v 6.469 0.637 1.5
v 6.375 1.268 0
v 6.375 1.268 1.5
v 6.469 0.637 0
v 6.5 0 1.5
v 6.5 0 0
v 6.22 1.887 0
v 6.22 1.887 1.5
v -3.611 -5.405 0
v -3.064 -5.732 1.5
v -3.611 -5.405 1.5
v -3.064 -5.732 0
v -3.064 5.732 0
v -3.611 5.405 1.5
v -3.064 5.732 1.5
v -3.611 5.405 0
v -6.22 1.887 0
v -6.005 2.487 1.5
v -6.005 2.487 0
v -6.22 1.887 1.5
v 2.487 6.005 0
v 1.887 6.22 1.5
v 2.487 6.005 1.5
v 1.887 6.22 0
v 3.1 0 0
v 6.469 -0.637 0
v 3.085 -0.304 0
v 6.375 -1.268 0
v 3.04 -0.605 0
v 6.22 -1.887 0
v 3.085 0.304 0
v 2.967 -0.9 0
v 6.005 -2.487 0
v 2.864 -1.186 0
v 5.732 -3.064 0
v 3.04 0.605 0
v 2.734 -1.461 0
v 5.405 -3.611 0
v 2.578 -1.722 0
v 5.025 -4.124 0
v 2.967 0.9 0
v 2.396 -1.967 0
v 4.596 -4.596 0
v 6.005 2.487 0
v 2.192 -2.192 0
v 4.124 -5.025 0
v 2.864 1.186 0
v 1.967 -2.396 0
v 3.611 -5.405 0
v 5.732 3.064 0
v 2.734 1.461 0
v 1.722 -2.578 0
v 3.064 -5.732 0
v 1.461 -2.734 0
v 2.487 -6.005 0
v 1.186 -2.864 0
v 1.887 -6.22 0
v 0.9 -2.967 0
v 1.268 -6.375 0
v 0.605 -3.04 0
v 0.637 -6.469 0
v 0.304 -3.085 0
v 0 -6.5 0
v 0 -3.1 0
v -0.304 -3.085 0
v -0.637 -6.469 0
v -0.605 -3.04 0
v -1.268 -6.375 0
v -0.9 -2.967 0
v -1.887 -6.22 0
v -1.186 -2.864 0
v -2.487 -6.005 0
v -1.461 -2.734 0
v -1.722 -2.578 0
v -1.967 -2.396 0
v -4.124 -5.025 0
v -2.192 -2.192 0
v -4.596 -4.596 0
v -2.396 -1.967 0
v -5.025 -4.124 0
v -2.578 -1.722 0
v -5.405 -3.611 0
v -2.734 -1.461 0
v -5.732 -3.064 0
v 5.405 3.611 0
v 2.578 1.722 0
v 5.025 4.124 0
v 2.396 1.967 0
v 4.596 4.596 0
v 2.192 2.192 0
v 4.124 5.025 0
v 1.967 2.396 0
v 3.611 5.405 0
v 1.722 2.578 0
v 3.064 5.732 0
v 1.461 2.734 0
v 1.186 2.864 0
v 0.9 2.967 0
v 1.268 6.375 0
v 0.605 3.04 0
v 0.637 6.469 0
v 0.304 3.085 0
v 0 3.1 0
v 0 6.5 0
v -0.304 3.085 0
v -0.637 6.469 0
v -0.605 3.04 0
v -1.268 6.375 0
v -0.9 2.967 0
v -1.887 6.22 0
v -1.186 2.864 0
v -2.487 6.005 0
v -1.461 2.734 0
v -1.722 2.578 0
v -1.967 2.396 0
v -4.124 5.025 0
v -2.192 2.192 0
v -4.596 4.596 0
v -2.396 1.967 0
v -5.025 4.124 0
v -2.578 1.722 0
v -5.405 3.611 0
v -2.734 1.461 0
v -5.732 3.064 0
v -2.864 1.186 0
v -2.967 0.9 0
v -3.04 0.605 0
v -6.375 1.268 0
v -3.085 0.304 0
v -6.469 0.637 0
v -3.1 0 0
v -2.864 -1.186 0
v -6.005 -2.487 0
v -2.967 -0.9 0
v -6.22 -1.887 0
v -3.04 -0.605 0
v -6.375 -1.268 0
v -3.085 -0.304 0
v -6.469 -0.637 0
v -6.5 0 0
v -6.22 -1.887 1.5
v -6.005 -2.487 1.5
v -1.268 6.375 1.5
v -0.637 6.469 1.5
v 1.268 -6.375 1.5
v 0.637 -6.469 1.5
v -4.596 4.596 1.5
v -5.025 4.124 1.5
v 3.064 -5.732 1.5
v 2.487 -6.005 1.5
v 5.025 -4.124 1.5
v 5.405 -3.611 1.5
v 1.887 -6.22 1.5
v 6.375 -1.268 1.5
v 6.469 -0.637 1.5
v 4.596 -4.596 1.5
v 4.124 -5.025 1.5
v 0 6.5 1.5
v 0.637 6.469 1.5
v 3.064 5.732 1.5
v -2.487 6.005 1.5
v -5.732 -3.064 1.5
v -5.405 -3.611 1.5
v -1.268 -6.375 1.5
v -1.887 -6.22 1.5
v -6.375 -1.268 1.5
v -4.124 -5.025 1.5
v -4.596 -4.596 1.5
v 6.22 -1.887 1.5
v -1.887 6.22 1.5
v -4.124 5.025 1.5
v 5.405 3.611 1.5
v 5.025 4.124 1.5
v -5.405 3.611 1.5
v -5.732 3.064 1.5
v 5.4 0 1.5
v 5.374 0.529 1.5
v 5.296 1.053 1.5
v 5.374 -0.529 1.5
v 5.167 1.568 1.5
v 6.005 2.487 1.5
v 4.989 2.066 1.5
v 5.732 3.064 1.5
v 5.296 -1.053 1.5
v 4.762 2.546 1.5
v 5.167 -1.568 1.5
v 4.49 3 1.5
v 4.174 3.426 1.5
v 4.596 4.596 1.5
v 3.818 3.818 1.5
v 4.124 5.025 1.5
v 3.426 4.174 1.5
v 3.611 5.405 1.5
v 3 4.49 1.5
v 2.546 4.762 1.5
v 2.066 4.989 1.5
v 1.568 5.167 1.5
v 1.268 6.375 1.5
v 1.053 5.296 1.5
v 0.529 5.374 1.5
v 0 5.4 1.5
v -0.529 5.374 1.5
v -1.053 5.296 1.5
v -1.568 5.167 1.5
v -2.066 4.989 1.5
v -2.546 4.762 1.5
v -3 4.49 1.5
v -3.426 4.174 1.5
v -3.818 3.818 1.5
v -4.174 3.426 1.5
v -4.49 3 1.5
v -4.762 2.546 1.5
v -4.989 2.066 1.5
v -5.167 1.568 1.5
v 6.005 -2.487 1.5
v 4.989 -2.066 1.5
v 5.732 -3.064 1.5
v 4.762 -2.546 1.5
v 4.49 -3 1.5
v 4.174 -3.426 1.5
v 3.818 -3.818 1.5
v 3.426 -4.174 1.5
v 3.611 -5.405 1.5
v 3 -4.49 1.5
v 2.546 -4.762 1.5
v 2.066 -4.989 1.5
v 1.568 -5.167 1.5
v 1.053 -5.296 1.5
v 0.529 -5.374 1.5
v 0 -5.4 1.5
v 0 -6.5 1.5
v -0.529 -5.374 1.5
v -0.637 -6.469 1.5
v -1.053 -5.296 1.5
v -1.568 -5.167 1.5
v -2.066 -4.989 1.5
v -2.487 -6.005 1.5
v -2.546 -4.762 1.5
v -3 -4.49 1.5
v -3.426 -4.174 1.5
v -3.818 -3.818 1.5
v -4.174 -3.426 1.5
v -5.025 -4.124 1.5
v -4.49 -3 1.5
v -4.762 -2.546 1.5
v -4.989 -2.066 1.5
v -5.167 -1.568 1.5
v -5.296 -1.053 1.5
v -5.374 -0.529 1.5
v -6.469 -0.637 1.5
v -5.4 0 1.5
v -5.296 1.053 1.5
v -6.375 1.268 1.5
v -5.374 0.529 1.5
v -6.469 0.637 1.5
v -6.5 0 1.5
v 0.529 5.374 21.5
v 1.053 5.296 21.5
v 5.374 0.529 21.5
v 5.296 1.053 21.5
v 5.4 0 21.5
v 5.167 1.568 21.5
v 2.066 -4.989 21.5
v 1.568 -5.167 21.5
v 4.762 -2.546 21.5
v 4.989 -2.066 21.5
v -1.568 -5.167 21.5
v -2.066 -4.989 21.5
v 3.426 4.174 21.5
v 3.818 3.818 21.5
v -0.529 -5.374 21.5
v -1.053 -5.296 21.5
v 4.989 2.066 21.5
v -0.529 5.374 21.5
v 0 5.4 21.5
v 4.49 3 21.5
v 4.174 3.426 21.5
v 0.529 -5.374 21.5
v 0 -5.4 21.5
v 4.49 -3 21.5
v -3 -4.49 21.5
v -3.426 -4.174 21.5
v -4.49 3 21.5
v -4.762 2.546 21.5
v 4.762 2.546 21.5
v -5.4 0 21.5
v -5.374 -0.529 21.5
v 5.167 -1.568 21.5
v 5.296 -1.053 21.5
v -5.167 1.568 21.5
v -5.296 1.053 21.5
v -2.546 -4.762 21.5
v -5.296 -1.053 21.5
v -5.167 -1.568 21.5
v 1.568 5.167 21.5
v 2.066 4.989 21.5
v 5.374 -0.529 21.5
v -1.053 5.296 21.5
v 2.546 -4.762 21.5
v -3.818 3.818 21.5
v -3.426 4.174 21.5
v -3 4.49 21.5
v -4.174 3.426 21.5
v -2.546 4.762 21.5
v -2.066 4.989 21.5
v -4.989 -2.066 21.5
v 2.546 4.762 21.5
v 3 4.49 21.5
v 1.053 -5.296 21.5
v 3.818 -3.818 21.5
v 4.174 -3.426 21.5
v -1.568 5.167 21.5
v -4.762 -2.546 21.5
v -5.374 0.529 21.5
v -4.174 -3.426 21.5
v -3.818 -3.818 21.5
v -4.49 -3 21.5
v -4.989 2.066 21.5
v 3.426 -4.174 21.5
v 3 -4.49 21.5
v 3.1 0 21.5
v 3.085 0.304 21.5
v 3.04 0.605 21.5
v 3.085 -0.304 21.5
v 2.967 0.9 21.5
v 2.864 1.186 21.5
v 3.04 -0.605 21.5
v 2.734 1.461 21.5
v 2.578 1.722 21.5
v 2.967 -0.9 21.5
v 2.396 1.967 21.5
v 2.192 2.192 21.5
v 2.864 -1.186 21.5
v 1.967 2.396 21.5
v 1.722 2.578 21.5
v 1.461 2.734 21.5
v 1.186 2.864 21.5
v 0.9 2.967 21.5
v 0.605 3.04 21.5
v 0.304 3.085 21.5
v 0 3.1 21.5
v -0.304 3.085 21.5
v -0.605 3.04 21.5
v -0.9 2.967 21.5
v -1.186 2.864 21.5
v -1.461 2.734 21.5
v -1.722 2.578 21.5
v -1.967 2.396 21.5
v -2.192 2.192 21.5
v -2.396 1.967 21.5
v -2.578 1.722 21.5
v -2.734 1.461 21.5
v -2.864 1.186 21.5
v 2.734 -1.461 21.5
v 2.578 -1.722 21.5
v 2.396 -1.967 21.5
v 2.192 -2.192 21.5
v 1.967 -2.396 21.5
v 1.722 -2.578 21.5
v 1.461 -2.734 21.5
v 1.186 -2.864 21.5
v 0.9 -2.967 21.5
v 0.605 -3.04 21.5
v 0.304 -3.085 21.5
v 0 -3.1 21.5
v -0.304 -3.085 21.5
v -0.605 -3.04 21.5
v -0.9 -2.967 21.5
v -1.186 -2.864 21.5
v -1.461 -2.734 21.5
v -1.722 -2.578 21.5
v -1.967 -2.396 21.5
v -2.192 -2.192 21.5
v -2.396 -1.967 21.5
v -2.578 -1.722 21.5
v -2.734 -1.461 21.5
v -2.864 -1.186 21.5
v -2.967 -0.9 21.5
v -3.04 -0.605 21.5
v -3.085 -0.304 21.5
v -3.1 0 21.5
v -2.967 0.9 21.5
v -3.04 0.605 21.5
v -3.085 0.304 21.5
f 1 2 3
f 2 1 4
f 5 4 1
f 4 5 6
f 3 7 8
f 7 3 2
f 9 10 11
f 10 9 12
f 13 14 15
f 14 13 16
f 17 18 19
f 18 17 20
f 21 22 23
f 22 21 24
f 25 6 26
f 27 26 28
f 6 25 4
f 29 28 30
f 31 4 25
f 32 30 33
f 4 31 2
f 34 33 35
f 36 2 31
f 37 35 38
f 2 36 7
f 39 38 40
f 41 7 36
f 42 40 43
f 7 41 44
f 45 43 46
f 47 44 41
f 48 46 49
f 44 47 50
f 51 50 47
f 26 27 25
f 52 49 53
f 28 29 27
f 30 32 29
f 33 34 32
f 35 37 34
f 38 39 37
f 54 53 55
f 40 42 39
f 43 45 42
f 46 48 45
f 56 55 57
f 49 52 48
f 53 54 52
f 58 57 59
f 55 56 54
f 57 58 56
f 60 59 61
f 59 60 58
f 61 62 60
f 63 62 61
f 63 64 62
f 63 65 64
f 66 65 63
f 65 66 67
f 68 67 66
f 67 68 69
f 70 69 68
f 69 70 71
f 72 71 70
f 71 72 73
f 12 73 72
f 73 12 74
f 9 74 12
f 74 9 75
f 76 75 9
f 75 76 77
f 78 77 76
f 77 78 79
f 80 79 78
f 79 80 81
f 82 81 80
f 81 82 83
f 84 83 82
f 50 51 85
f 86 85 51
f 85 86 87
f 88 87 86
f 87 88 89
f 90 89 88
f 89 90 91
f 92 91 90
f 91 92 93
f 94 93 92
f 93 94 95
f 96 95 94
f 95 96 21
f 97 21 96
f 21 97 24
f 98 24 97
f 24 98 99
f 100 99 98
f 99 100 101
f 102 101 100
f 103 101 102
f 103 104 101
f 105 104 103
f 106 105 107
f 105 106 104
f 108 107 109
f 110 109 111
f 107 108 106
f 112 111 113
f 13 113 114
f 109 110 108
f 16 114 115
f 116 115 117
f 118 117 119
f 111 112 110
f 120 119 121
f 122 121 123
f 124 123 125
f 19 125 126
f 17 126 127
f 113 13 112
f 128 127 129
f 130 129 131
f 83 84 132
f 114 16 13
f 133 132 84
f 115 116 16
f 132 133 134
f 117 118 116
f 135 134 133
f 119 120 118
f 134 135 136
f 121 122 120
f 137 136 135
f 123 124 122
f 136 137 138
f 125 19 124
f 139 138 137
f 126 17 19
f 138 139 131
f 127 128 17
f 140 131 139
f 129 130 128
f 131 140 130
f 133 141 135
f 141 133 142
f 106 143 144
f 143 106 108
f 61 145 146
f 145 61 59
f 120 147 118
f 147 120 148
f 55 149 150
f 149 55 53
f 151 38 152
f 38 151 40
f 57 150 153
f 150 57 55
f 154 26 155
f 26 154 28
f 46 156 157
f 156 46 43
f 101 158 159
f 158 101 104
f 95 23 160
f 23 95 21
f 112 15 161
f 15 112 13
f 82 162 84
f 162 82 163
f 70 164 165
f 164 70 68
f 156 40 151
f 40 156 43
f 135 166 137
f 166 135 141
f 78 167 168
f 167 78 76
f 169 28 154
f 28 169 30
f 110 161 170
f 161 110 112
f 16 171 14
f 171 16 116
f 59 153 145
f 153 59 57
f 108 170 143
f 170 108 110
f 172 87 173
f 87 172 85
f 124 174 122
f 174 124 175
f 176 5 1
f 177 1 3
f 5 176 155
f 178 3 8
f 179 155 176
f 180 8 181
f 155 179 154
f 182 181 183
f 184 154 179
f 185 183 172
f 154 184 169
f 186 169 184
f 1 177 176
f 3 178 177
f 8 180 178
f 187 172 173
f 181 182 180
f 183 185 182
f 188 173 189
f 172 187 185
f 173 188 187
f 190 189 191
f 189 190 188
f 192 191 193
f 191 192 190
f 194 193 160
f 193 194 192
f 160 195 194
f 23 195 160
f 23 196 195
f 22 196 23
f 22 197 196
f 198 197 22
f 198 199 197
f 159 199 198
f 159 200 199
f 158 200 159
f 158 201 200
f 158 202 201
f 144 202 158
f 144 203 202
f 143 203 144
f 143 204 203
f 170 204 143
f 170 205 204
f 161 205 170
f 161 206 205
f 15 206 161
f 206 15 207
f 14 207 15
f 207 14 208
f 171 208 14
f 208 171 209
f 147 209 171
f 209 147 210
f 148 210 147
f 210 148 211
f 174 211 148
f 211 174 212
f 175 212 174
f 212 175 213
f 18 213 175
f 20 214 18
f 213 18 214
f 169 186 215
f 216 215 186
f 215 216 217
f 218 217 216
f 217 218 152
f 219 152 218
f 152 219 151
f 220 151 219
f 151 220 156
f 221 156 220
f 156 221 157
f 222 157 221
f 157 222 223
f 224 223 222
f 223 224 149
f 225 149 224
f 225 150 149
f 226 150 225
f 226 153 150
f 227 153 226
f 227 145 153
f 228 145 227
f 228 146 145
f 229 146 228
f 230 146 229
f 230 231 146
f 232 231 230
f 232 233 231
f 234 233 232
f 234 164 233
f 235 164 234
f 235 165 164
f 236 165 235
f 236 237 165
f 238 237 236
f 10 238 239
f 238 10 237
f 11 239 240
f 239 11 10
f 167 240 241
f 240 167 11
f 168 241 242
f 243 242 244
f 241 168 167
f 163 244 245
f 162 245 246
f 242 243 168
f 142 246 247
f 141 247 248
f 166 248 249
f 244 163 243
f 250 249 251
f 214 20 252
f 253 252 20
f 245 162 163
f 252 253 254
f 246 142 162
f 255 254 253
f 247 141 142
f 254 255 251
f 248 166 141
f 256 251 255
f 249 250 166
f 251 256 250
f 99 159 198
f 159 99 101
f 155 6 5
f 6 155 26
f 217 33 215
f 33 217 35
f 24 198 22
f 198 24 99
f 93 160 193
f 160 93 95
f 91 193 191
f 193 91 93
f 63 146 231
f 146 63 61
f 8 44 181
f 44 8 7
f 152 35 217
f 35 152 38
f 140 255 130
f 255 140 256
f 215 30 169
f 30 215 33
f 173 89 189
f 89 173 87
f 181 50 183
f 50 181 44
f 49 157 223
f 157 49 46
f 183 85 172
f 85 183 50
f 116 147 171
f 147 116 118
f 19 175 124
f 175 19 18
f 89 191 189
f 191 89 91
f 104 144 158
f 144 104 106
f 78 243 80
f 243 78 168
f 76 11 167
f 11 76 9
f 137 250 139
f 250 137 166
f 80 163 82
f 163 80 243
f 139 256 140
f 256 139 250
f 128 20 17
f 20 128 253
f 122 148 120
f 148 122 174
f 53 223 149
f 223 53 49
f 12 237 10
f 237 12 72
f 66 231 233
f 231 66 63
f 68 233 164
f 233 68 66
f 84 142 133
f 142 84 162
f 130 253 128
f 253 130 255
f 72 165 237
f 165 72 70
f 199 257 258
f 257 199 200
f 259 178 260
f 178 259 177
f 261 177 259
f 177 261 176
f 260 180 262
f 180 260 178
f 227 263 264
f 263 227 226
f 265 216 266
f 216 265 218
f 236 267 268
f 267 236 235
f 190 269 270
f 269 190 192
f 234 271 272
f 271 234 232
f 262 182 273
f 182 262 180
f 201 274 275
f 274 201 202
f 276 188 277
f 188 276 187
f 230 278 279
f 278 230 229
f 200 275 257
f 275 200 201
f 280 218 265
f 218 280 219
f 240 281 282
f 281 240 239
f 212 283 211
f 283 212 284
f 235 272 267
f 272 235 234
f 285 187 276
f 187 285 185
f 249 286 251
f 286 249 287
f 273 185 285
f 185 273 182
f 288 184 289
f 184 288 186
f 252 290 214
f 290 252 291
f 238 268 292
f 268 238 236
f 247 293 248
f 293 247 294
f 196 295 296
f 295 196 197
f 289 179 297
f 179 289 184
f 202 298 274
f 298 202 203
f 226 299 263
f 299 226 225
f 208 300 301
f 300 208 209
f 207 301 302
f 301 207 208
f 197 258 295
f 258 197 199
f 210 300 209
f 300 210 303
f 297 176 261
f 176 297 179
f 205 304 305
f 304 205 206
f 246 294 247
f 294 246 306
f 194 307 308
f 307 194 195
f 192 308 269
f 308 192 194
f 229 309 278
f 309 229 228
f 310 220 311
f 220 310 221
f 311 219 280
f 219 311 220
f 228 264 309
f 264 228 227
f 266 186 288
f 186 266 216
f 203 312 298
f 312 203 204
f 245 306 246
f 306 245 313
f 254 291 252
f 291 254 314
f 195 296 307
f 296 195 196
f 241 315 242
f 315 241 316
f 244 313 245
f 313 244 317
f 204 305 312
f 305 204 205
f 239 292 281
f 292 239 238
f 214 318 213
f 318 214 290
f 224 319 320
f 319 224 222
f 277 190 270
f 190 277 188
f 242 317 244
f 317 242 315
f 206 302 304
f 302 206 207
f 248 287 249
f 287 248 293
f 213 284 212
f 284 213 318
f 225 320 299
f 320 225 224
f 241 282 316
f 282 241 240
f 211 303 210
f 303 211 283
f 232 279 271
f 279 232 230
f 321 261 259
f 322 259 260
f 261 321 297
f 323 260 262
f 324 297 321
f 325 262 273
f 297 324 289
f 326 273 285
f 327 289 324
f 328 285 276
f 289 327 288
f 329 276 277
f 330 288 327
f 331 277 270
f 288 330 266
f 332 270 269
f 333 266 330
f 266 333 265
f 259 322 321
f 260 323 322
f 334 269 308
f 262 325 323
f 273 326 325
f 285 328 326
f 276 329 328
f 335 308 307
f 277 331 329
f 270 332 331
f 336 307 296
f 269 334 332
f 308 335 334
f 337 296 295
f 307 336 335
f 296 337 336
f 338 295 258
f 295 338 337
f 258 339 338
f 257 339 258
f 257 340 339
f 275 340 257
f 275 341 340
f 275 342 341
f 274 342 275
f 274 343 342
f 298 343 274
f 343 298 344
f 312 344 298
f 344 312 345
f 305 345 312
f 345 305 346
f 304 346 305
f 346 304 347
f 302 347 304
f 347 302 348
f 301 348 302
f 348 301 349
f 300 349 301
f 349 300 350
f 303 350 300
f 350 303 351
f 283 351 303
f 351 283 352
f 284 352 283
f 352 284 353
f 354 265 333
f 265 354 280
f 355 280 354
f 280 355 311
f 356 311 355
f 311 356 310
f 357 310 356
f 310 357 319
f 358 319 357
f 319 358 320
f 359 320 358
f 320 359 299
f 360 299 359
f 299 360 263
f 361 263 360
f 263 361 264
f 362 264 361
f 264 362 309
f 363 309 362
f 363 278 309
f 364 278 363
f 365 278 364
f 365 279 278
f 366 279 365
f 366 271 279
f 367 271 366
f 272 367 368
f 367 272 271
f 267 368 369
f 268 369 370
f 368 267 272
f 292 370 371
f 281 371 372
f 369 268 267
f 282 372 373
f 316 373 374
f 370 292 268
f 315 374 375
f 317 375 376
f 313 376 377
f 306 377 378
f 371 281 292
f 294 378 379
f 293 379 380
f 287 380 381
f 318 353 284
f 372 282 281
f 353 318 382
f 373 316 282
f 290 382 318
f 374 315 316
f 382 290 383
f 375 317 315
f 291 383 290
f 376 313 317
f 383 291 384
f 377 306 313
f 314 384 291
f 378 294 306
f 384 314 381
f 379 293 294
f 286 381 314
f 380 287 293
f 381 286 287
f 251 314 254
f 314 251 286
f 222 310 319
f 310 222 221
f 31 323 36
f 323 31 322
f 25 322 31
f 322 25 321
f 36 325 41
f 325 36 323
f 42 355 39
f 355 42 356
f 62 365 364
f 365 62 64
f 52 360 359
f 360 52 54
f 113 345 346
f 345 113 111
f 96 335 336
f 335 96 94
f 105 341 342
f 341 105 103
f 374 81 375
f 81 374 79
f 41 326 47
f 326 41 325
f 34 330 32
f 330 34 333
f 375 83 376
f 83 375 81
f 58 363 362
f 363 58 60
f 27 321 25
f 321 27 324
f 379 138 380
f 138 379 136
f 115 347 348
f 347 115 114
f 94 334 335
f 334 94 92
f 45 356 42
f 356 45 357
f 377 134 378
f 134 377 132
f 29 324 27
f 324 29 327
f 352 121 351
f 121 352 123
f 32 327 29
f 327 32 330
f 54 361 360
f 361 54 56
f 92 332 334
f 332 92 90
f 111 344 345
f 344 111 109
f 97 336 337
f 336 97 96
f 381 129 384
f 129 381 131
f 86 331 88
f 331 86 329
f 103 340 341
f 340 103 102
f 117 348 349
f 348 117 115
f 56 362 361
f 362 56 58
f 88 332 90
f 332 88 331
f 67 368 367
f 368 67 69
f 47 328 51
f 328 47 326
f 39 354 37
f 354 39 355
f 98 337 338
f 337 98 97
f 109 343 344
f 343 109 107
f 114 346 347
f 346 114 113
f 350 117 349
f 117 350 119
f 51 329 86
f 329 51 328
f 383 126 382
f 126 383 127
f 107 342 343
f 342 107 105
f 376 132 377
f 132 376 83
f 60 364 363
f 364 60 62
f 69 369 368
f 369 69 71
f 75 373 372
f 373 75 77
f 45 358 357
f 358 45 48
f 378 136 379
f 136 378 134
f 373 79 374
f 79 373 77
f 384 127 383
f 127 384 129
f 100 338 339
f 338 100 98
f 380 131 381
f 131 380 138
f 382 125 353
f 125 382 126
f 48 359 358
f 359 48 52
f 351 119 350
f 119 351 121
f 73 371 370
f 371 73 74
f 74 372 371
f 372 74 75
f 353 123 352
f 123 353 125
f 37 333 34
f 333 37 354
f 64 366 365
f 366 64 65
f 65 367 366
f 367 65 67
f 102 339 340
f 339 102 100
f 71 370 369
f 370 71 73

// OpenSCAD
// Adapter sleeve: 0.2 mL PCR tube for a 1.5 mL rack hole
// Print orientation: collar down on the bed (z = 0), sleeve up (+Z)

$fn = 64;

// ---- Dimensions (mm) ----
collar_d      = 13;    // collar diameter (base)
collar_h      = 1.5;   // collar thickness (z = 0 to 1.5)
sleeve_od     = 10.8;  // sleeve outer diameter
sleeve_top_z  = 21.5;  // top of sleeve (z)
bore_d        = 6.2;   // through-bore diameter
eps           = 0.5;   // cutter overshoot past faces

// ---- Model ----
difference() {
    union() {
        // Base collar
        cylinder(d = collar_d, h = collar_h);
        // Sleeve body (slightly overlaps collar for a clean union)
        translate([0, 0, collar_h - 0.01])
            cylinder(d = sleeve_od, h = sleeve_top_z - collar_h + 0.01);
    }
    // Straight through-bore, open at both ends
    translate([0, 0, -eps])
        cylinder(d = bore_d, h = sleeve_top_z + 2 * eps);
}
